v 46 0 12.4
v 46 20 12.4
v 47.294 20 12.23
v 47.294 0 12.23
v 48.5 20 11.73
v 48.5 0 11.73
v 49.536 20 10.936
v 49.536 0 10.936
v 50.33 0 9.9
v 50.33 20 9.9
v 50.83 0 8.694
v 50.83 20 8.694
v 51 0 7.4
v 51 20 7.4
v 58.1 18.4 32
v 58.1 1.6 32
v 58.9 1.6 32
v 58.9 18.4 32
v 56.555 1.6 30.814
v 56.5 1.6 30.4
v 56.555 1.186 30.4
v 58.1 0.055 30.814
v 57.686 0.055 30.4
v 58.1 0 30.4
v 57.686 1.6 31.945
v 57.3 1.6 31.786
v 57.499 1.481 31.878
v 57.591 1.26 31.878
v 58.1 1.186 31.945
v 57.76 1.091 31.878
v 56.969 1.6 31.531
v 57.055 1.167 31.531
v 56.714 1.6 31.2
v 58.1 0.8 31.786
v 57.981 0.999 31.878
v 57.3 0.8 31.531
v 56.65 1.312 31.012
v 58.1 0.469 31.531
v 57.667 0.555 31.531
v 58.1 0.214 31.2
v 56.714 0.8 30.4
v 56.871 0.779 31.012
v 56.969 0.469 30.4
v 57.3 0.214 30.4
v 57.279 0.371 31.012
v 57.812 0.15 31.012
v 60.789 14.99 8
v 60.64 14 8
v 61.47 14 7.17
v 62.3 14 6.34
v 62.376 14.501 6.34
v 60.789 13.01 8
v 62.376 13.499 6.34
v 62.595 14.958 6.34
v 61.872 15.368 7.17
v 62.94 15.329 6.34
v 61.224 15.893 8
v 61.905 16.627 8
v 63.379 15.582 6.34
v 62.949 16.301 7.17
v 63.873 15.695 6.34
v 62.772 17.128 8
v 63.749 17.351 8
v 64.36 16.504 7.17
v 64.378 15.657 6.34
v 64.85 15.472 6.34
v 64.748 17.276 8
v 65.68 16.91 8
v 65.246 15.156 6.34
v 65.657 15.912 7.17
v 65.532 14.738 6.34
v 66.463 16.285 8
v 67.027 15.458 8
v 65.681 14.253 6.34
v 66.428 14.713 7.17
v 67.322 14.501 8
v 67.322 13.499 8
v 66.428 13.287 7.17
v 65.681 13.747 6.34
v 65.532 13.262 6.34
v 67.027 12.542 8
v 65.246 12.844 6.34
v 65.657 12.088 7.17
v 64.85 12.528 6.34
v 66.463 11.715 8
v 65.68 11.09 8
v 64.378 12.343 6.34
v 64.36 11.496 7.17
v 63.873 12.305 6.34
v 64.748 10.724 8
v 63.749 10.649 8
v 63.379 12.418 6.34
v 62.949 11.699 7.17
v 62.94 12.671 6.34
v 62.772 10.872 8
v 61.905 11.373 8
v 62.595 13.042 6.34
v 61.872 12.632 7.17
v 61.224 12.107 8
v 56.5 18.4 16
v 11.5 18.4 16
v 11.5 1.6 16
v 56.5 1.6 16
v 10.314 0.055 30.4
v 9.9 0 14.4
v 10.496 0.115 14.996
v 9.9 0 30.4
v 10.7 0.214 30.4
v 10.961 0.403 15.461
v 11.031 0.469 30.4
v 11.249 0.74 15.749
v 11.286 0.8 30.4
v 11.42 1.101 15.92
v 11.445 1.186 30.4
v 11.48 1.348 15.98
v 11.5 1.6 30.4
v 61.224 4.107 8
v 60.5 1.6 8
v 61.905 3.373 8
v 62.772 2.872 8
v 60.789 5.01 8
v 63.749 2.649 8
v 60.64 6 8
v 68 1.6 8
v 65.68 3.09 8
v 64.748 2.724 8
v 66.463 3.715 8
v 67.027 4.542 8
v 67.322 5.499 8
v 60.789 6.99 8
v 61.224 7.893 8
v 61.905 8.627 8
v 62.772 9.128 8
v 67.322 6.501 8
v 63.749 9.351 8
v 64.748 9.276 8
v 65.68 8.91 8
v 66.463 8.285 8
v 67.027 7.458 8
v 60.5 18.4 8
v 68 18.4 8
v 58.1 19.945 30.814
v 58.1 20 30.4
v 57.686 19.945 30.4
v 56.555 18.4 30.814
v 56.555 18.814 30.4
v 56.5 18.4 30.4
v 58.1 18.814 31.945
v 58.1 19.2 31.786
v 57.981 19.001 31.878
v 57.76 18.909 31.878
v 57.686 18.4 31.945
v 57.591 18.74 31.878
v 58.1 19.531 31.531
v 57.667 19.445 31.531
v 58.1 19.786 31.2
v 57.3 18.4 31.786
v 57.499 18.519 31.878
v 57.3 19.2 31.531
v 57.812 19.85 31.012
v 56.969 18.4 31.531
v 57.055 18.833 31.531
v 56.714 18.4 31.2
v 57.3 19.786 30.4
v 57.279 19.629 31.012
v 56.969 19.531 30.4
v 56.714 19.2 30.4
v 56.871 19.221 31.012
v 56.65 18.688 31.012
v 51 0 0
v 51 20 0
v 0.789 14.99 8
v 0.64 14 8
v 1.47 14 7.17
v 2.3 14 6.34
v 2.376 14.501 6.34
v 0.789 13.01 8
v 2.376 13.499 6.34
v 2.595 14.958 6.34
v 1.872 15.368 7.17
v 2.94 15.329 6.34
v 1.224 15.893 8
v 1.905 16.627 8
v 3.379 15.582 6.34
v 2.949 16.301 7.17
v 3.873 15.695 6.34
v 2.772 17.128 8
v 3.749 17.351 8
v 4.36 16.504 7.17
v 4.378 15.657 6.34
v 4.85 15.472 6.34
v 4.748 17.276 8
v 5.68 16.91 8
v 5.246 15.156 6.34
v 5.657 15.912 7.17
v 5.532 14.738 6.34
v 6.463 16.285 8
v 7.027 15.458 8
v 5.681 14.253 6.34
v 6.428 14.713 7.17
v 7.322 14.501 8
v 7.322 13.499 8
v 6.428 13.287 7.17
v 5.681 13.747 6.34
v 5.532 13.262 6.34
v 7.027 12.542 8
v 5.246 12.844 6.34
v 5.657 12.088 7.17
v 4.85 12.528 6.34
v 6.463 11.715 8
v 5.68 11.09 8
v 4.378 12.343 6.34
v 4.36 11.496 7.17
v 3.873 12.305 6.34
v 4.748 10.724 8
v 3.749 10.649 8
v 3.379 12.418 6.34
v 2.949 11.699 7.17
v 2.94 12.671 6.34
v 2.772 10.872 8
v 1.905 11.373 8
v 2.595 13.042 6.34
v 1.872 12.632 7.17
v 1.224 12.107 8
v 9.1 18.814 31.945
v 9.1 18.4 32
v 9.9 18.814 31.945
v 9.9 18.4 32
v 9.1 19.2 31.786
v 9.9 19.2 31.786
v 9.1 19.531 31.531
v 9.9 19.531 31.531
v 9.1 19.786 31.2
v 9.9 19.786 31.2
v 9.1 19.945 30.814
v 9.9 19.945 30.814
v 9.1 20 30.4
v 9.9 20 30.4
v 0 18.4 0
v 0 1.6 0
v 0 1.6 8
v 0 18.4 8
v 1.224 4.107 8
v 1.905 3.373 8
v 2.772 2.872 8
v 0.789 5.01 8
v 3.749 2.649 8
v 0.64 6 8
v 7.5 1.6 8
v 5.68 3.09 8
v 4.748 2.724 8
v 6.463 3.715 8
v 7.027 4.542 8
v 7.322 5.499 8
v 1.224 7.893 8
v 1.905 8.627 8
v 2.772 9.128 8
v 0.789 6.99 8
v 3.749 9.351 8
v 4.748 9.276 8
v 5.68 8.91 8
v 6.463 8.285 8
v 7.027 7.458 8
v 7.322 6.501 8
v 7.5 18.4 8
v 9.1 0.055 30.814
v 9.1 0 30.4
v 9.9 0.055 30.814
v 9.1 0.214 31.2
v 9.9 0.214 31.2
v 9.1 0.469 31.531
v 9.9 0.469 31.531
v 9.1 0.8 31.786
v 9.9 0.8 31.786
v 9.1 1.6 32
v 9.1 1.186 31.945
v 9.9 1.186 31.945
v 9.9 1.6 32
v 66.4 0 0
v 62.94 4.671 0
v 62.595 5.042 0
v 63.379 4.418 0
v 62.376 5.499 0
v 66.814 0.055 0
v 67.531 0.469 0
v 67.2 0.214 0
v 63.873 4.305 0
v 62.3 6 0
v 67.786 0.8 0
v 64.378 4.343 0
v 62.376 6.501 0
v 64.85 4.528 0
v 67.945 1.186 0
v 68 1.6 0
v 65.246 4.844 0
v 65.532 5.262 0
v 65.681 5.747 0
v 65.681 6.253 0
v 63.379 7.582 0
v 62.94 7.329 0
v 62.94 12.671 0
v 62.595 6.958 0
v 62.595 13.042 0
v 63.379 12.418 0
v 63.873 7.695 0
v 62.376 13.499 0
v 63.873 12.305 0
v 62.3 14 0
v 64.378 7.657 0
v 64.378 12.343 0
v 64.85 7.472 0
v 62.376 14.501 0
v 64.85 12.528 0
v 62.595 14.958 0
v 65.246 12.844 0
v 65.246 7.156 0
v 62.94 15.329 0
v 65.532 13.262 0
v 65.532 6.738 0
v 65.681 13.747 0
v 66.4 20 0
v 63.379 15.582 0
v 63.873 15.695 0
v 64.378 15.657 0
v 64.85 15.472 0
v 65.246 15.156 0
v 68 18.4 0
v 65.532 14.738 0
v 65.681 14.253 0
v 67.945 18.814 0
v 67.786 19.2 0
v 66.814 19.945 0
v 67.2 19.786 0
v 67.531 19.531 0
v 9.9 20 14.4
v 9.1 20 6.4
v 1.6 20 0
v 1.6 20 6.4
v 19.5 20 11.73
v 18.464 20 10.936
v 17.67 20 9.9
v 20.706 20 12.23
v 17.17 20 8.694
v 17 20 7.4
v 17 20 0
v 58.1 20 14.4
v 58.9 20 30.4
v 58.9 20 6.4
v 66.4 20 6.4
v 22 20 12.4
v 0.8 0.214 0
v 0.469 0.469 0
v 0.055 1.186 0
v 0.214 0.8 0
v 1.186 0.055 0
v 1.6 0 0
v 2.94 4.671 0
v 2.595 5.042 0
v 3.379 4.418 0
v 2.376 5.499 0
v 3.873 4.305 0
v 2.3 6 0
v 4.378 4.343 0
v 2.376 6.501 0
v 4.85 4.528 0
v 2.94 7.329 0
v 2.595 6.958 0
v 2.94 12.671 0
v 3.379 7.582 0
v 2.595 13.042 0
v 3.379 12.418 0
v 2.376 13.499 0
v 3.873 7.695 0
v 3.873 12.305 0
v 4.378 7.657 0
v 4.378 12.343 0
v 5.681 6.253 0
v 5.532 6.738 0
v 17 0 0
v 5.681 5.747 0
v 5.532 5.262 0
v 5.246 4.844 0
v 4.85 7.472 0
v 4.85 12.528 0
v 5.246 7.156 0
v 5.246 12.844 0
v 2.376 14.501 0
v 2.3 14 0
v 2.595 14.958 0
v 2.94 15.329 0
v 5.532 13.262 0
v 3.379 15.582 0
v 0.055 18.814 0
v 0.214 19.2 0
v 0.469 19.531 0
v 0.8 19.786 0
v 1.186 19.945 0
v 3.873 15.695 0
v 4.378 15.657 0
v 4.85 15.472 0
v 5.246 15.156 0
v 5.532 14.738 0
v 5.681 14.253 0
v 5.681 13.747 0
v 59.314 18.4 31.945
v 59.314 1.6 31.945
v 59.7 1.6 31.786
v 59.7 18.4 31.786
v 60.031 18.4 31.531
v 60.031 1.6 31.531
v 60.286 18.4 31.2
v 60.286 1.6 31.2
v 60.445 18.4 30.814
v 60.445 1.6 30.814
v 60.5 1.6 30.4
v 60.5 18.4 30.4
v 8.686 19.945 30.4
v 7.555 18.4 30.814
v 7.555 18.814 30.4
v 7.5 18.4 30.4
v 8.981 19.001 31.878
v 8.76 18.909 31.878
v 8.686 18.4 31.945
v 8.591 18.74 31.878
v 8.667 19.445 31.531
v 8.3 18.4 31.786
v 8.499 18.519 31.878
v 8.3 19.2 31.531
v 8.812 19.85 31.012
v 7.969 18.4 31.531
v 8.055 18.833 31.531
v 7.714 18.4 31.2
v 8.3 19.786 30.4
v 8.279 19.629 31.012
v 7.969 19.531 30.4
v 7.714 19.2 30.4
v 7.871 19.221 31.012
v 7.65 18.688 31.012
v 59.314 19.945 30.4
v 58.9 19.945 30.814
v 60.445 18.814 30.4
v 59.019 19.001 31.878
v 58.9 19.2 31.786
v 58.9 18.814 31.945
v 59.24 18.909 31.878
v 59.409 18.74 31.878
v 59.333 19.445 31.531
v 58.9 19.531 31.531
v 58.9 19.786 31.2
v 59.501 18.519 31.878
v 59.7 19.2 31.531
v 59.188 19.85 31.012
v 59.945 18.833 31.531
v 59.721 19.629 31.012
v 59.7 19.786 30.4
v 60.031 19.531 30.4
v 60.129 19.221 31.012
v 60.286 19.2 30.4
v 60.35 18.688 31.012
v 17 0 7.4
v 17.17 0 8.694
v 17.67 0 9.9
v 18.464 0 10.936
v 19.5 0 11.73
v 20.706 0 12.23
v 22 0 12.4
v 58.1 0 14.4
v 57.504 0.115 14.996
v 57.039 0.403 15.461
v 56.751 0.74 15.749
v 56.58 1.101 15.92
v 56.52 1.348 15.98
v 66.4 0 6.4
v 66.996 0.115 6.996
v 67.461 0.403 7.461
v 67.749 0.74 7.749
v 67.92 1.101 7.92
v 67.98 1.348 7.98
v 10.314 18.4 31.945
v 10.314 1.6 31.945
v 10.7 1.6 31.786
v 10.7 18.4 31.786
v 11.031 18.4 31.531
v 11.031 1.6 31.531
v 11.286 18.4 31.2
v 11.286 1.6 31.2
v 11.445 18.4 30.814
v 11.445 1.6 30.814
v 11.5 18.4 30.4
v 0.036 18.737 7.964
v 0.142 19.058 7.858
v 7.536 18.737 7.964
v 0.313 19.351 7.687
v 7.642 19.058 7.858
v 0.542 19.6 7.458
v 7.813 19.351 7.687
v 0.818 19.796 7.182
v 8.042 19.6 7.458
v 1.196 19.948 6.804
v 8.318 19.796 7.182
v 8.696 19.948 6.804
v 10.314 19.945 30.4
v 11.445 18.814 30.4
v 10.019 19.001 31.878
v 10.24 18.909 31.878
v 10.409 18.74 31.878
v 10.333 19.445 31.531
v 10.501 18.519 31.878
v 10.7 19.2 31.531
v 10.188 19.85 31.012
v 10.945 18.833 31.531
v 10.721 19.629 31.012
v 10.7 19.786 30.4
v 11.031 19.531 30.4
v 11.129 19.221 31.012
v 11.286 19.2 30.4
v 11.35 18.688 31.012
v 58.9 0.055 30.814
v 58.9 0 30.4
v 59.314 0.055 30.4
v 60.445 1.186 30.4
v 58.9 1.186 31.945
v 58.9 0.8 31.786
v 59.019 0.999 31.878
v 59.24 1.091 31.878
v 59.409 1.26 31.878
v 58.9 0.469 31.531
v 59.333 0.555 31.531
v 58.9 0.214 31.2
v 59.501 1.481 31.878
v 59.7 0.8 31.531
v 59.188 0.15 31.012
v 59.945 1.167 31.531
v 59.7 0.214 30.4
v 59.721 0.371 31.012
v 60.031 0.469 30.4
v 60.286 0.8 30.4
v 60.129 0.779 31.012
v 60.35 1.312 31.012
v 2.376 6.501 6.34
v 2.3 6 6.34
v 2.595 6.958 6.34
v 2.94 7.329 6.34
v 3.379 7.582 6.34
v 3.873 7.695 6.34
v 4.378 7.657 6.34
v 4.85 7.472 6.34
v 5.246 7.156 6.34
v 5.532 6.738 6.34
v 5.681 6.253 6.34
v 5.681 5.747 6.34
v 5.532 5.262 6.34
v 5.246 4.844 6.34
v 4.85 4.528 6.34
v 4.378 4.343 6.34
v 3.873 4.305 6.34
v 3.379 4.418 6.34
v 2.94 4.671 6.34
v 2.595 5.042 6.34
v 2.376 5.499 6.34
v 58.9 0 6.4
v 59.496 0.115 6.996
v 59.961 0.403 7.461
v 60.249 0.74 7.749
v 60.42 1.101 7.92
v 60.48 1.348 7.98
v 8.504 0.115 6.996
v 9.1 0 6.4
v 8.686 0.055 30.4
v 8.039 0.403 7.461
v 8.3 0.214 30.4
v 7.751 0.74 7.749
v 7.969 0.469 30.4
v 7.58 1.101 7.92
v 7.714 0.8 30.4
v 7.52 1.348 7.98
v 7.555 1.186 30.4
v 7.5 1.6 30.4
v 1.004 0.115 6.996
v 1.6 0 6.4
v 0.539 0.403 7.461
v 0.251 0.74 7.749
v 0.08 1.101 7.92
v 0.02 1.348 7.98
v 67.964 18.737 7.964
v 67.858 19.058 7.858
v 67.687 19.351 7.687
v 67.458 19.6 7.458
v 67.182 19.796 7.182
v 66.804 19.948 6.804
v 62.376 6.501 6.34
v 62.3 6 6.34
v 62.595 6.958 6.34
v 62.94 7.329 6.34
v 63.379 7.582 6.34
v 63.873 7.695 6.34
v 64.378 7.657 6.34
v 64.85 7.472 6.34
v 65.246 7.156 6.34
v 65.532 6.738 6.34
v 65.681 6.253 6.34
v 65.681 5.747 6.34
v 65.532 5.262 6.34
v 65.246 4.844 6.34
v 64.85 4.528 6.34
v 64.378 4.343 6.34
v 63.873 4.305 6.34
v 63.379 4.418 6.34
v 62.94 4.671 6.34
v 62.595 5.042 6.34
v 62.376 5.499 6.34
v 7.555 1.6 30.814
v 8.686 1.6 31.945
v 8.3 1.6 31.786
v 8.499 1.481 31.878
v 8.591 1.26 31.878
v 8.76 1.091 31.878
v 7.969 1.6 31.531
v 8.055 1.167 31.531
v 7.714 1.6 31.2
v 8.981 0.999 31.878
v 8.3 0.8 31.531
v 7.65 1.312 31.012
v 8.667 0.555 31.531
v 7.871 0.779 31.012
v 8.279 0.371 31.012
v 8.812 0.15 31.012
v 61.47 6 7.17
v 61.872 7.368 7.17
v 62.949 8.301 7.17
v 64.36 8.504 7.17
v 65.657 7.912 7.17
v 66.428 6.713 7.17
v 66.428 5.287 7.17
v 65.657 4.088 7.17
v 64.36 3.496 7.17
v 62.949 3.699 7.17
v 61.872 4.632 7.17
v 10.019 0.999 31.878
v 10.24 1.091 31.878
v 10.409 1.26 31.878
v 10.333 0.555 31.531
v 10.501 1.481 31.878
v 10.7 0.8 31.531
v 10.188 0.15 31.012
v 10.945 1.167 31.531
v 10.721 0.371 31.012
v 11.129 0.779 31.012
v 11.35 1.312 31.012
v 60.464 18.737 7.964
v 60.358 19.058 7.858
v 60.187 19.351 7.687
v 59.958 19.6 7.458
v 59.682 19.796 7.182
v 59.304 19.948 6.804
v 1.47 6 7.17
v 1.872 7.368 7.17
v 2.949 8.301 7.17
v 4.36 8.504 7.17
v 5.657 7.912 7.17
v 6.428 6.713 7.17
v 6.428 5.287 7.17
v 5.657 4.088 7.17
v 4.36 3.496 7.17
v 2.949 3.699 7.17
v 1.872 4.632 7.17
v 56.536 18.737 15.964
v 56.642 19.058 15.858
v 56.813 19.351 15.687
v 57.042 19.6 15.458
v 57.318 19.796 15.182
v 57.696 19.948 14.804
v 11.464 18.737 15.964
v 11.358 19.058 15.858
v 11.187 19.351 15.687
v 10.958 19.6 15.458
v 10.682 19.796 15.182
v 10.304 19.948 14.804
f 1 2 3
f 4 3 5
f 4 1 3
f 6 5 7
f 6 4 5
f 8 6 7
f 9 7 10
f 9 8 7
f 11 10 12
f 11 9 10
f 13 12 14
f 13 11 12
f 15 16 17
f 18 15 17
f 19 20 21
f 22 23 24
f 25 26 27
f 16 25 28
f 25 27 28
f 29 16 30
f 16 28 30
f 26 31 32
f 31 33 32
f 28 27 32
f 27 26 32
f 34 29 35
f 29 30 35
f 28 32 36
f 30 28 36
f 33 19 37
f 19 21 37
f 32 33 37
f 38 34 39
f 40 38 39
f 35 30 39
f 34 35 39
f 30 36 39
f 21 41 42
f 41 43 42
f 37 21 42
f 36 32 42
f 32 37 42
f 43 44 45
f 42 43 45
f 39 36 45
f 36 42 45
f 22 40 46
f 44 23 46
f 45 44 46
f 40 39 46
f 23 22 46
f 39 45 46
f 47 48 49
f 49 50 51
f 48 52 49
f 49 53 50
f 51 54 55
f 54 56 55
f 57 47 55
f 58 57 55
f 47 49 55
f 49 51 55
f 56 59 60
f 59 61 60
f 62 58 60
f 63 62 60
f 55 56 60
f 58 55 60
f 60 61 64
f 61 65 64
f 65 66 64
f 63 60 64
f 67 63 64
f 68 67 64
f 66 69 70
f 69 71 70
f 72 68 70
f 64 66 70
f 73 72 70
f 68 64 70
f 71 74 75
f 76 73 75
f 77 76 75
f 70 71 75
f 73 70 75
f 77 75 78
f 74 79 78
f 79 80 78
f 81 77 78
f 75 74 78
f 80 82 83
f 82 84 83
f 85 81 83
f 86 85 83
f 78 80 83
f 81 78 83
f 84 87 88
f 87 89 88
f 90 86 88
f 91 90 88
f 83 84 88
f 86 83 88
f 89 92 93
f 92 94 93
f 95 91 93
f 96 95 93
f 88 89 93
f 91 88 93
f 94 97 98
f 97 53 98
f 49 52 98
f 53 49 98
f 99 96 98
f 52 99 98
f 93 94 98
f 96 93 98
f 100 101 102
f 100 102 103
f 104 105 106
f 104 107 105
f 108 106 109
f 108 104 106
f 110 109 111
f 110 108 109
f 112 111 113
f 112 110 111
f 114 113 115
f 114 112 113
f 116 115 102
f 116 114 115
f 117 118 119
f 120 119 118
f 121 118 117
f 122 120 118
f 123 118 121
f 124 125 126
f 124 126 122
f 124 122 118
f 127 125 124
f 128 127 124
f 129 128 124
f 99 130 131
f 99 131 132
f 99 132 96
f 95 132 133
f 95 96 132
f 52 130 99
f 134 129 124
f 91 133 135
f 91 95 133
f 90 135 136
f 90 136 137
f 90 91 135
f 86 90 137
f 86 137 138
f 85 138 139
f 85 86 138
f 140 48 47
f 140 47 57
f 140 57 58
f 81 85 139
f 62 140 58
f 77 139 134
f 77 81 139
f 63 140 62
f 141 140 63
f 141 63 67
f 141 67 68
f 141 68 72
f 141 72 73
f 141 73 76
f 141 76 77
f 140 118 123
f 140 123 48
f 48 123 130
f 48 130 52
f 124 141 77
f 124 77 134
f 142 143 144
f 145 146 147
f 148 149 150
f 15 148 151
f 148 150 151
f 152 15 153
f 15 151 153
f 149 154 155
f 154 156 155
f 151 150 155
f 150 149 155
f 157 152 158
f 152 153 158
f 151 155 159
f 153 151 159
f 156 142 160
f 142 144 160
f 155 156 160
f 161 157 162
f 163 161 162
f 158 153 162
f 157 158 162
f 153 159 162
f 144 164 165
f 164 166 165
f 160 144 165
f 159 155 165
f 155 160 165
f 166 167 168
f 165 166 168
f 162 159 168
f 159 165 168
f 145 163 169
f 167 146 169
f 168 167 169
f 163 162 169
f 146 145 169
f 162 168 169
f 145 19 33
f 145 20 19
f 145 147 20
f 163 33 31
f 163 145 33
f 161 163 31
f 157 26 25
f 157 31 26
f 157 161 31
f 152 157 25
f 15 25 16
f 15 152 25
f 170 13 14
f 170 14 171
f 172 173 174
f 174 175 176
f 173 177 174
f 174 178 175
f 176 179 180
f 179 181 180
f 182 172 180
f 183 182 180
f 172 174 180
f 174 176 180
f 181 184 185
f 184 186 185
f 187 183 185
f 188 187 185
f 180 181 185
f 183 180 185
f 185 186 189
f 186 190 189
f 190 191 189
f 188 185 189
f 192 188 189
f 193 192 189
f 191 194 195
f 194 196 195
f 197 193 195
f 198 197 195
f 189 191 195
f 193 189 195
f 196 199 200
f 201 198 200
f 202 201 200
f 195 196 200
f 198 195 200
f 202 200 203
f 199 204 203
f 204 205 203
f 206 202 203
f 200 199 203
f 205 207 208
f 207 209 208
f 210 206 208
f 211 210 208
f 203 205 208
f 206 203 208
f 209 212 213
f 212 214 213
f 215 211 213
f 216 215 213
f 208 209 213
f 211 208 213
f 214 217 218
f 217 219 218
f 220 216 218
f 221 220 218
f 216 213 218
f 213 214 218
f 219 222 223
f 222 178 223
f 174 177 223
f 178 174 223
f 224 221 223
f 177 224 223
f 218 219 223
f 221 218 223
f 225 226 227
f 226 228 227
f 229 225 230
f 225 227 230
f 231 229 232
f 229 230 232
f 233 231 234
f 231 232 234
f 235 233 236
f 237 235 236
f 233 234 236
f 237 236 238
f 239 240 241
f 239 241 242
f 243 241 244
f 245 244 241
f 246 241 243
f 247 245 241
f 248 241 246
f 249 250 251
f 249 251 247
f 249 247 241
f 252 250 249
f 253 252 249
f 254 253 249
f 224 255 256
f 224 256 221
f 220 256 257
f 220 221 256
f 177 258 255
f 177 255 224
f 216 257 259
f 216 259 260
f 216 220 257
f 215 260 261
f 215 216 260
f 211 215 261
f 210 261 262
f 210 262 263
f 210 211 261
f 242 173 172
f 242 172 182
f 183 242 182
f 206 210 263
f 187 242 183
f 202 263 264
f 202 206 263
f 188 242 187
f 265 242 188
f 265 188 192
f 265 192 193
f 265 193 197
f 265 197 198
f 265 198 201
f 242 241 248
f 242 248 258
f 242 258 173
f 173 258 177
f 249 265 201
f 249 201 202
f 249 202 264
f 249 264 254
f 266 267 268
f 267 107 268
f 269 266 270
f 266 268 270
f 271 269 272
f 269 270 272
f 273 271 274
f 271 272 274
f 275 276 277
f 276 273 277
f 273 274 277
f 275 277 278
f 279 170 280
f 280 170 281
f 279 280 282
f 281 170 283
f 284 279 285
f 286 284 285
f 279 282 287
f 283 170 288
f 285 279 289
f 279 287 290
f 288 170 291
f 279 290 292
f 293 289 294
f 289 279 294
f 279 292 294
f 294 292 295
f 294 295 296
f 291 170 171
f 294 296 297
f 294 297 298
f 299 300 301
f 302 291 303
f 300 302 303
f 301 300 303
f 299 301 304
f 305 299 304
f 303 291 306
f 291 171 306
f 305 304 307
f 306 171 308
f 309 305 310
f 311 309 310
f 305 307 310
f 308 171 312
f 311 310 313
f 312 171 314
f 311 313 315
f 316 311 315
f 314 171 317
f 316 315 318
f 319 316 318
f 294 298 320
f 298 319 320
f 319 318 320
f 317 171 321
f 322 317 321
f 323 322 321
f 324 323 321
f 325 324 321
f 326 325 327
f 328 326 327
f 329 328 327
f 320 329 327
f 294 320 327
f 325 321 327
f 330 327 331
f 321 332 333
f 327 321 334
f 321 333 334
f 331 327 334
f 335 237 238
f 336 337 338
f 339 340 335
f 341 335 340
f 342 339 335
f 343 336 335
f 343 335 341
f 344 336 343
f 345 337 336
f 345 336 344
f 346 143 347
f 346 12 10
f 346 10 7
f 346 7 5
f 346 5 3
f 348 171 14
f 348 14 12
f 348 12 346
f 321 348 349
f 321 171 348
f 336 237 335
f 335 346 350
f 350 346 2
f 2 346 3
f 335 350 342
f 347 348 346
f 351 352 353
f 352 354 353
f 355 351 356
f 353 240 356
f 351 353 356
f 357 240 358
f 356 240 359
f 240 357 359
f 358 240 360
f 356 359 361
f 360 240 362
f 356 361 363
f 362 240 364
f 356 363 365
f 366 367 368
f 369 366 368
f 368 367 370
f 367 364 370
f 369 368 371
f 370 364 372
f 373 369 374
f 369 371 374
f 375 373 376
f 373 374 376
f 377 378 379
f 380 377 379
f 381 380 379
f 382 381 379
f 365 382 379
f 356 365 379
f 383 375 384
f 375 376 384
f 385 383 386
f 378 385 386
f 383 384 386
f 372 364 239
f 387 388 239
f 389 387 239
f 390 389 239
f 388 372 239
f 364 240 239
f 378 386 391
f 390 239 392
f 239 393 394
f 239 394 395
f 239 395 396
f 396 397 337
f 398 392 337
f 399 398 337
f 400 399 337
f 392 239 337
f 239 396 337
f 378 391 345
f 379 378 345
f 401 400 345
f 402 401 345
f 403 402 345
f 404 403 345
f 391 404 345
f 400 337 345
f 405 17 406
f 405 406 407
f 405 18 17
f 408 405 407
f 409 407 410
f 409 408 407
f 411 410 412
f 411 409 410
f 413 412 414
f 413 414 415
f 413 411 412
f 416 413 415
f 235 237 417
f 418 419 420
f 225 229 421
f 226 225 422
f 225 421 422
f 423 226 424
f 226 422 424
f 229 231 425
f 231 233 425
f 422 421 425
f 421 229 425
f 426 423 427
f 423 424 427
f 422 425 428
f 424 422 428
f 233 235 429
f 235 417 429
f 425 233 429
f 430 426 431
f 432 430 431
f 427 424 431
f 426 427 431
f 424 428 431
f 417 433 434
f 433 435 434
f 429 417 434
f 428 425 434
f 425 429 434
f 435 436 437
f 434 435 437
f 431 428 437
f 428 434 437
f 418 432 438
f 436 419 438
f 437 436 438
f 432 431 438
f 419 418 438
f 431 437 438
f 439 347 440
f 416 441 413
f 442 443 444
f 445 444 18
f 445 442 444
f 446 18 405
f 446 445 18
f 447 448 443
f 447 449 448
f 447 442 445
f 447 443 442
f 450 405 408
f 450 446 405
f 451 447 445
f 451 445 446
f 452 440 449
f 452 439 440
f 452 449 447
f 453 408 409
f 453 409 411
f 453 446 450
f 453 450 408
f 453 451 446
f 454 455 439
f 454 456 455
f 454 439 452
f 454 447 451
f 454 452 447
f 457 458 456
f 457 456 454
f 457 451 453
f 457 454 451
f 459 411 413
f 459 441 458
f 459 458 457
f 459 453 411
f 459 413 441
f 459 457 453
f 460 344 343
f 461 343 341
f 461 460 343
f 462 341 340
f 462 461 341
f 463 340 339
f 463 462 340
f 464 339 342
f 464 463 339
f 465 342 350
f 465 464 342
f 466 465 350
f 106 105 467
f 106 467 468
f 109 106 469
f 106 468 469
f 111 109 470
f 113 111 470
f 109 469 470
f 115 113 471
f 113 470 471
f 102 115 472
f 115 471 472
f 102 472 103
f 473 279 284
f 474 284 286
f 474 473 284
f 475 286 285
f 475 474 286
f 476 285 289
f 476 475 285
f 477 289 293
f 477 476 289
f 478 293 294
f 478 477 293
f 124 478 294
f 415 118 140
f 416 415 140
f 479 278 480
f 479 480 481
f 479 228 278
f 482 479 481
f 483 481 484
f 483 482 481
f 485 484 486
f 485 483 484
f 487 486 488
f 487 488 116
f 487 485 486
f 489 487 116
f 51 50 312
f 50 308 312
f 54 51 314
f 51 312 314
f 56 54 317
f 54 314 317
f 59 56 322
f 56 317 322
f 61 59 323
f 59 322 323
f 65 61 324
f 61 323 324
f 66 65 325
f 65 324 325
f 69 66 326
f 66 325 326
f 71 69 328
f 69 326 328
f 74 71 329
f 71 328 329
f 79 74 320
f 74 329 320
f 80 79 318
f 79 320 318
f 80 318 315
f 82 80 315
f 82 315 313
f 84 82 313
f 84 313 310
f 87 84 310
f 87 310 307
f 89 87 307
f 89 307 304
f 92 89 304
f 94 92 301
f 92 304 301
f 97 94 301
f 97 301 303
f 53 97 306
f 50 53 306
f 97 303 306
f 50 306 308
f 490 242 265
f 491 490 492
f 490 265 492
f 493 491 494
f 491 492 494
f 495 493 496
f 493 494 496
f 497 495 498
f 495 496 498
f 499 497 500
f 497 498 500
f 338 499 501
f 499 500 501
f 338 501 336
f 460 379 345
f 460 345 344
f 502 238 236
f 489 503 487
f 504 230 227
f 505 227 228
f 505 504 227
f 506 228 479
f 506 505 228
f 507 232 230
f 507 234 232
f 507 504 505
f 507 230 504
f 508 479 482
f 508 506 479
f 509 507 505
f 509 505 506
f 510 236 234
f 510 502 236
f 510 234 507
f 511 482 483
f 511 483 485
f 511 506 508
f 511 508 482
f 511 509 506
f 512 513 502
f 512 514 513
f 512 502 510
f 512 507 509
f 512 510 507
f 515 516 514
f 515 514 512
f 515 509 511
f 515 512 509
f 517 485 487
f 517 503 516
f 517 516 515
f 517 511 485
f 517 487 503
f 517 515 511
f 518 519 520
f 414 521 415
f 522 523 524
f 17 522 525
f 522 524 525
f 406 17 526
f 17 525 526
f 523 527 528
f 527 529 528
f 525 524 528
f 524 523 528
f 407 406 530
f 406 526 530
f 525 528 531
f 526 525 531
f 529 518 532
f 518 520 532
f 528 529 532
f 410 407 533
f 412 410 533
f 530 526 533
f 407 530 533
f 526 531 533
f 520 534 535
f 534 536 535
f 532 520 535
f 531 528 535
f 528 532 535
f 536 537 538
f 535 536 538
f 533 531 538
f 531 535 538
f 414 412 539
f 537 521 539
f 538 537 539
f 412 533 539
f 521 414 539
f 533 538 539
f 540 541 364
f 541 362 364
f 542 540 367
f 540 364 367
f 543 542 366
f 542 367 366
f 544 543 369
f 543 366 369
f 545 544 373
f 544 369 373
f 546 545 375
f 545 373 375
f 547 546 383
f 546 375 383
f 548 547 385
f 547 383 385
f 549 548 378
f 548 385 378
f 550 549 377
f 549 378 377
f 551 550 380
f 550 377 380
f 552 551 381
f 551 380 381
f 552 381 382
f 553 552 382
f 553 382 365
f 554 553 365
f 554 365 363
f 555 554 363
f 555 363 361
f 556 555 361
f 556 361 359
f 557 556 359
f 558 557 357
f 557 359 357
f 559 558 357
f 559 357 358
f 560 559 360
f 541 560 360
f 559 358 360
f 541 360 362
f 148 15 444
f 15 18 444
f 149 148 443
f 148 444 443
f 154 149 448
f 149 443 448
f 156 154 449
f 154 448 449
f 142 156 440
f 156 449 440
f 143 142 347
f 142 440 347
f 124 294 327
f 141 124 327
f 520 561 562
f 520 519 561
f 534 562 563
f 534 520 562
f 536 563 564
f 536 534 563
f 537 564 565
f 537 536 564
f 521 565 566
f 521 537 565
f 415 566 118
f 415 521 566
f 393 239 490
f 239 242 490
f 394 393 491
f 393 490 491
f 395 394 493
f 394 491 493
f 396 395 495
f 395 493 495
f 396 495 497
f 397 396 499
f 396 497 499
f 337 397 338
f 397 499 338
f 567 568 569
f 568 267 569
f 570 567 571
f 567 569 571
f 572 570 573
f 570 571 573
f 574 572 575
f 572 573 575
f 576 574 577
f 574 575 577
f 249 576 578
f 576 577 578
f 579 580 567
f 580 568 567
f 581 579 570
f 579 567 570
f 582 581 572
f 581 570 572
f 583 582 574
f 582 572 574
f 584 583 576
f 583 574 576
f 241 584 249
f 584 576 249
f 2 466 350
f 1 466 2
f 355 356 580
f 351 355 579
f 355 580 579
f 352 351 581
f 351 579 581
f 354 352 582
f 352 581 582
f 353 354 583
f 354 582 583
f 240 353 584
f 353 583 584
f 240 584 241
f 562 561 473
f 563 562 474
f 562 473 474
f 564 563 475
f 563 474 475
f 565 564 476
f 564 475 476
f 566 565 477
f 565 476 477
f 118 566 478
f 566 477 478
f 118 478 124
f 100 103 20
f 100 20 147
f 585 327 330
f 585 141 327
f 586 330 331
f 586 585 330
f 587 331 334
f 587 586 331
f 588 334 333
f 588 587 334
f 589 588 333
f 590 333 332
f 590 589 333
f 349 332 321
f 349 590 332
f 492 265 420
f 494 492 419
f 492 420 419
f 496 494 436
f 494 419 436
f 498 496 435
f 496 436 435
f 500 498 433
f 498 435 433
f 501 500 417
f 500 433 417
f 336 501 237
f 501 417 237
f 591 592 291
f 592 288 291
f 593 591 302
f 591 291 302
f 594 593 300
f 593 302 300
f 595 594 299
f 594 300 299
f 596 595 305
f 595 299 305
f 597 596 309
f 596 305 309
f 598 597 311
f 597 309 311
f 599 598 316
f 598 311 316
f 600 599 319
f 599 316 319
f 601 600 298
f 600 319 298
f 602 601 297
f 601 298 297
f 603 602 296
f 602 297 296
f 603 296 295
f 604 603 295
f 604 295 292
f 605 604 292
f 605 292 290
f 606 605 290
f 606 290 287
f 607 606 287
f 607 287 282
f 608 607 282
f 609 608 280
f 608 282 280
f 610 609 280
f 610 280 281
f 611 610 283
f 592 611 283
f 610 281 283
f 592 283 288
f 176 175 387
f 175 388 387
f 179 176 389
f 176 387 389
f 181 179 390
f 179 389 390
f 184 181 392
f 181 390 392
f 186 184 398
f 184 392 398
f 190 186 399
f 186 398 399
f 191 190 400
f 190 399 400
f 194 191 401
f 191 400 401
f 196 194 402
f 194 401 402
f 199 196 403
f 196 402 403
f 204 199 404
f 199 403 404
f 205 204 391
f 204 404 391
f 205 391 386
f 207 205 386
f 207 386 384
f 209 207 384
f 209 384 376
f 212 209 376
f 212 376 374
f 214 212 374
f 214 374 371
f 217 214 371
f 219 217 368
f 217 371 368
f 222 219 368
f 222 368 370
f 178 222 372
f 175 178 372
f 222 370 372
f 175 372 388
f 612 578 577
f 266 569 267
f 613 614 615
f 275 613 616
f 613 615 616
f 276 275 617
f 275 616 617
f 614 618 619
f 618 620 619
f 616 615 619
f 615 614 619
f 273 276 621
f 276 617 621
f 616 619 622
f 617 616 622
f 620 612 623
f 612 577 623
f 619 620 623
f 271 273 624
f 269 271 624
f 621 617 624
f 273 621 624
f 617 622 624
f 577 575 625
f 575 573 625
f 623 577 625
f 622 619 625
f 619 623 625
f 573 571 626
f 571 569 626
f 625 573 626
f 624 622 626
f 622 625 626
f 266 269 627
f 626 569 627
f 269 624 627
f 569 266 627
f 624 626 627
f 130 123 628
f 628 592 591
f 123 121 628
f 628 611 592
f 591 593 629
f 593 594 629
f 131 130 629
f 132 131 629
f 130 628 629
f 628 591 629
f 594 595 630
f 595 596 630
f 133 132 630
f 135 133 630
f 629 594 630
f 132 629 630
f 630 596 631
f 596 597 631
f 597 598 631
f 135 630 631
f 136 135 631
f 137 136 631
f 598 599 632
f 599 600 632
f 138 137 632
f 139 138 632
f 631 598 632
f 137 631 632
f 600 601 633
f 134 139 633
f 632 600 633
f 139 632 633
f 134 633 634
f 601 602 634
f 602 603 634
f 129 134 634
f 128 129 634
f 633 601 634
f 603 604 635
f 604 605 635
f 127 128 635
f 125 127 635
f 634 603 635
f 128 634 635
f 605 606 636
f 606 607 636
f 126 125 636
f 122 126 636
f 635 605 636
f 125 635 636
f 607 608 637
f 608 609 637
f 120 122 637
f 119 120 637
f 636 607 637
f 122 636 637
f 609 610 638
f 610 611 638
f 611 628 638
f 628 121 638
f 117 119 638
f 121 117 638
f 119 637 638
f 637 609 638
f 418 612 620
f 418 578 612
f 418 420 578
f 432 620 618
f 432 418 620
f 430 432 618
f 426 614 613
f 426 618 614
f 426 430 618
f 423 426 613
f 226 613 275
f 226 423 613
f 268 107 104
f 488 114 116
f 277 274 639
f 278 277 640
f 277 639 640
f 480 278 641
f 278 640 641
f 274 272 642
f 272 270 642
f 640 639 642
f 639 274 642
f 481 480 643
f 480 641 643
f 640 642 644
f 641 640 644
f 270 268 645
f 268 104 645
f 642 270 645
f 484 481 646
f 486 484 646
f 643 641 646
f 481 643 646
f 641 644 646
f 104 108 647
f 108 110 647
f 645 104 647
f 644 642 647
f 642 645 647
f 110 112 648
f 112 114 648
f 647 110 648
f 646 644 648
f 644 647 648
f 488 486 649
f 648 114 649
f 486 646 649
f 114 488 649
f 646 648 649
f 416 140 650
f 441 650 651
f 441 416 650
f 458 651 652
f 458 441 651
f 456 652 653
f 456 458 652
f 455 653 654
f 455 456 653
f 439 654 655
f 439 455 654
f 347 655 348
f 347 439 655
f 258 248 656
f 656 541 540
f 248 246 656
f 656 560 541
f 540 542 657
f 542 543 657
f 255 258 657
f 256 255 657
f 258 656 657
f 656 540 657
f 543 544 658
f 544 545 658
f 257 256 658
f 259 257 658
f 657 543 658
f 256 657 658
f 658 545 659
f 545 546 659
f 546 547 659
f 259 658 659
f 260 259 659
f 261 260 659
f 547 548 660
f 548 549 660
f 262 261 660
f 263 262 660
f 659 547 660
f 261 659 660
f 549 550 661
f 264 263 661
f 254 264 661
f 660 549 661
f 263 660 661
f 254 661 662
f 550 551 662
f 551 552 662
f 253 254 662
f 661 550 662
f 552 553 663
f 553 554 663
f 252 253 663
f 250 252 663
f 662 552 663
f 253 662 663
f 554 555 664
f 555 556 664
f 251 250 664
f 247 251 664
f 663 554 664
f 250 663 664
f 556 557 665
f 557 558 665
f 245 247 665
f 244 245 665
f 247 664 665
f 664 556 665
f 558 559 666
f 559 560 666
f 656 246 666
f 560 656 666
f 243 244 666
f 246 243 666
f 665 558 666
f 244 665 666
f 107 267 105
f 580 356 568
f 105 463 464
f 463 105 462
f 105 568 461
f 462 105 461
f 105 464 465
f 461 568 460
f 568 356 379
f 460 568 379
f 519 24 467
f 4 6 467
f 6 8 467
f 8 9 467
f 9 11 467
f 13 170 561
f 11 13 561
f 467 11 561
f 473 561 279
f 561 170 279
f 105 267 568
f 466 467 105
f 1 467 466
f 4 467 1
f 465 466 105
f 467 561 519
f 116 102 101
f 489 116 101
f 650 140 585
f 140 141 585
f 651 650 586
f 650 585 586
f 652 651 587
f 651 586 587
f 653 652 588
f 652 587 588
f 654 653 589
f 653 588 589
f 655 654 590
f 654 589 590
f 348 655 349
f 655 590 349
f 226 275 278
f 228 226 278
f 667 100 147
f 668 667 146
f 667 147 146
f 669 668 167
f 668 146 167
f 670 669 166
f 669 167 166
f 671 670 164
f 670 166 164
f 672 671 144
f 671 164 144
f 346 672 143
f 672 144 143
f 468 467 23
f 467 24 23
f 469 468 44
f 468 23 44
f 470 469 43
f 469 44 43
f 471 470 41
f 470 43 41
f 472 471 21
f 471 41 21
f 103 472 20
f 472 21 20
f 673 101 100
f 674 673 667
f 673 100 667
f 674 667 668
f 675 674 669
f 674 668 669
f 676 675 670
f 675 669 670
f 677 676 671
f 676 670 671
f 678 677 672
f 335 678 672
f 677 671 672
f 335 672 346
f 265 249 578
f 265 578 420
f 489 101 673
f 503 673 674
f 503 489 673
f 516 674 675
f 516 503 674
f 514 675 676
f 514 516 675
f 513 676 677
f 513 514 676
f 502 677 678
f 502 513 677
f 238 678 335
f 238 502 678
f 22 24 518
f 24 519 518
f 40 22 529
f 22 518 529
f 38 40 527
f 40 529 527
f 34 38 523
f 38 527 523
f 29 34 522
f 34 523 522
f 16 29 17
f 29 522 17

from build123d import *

# Parameters (mm, degrees)
ESBO_O1_W                                           = 68
ESBO_O1_H                                           = 20
RESSALTO_EXTRUS_O1_DEPTH                            = 8
ESCAREADO_PARA_PARAFUSO_ALLEN_SEXTAVADO_D           = 3.4
ESCAREADO_PARA_PARAFUSO_ALLEN_SEXTAVADO_CSINK_D     = 6.72
ESCAREADO_PARA_PARAFUSO_ALLEN_SEXTAVADO_CSINK_ANGLE = 90
ESBO_O4_W                                           = 4
ESBO_O4_H                                           = 20
RESSALTO_EXTRUS_O2_DEPTH                            = 24
ESBO_O5_W                                           = 45
ESBO_O5_H                                           = 20
RESSALTO_EXTRUS_O3_DEPTH                            = 8
FILETE1_R                                           = 1.6
CORTE_EXTRUS_O1_DEPTH                               = 78.768888381


with BuildPart() as part:
    # Esboço1 → Ressalto-extrusão1 (new body)
    with BuildSketch(Plane.XY):
        with Locations((34, 10)):
            Rectangle(ESBO_O1_W, ESBO_O1_H)
    extrude(amount=RESSALTO_EXTRUS_O1_DEPTH)

    # Escareado para parafuso Allen sextavado escareado de M31 (through all)
    with Locations(Plane(origin=(4, 14, 8), x_dir=(1, 0, 0), z_dir=(0, 0, 1))):
        with Locations((0, 0), (0, -8), (60, 0), (60, -8)):
            CounterSinkHole(ESCAREADO_PARA_PARAFUSO_ALLEN_SEXTAVADO_D / 2, ESCAREADO_PARA_PARAFUSO_ALLEN_SEXTAVADO_CSINK_D / 2, counter_sink_angle=ESCAREADO_PARA_PARAFUSO_ALLEN_SEXTAVADO_CSINK_ANGLE)

    # Esboço4 → Ressalto-extrusão2 (add)
    with BuildSketch(Plane.XY.offset(8)):
        with Locations((9.5, 10)):
            Rectangle(ESBO_O4_W, ESBO_O4_H)
        with Locations((58.5, 10)):
            Rectangle(ESBO_O4_W, ESBO_O4_H)
    extrude(amount=RESSALTO_EXTRUS_O2_DEPTH)

    # Esboço5 → Ressalto-extrusão3 (add)
    with BuildSketch(Plane.XY.offset(8)):
        with Locations((34, 10)):
            Rectangle(ESBO_O5_W, ESBO_O5_H)
    extrude(amount=RESSALTO_EXTRUS_O3_DEPTH)

    # Filete1
    filete1_edges = [part.edges().sort_by_distance(p)[0] for p in [
        (64.25, 20, 8),
        (64.25, 0, 8),
        (60.5, 20, 20),
        (56.5, 20, 24),
        (56.5, 0, 24),
        (60.5, 0, 20),
        (58.5, 20, 32),
        (56.5, 10, 32),
        (58.5, 0, 32),
        (60.5, 10, 32),
        (3.75, 20, 8),
        (11.5, 20, 24),
        (7.5, 20, 20),
        (7.5, 0, 20),
        (11.5, 0, 24),
        (9.5, 20, 32),
        (7.5, 10, 32),
        (9.5, 0, 32),
        (11.5, 10, 32),
        (34, 20, 16),
        (34, 0, 16),
        (0, 20, 4),
        (68, 20, 4),
        (68, 0, 4),
        (0, 0, 4),
        (3.75, 0, 8),
    ]]
    fillet(filete1_edges, radius=FILETE1_R)

    # Esboço6 → Corte-extrusão1 (cut, through all)
    with BuildSketch(Plane.XZ):
        with BuildLine():
            Line((17, 6.4), (17, 7.4))
            ThreePointArc((17, 7.4), (18.464466094, 10.935533906), (22, 12.4))
            Line((22, 12.4), (46, 12.4))
            ThreePointArc((46, 12.4), (49.535533906, 10.935533906), (51, 7.4))
            Line((51, 7.4), (51, 6.4))
            Line((51, 6.4), (51, 0))
            Line((51, 0), (17, 0))
            Line((17, 0), (17, 6.4))
        make_face()
    extrude(amount=-CORTE_EXTRUS_O1_DEPTH, mode=Mode.SUBTRACT)


solid = part.part
